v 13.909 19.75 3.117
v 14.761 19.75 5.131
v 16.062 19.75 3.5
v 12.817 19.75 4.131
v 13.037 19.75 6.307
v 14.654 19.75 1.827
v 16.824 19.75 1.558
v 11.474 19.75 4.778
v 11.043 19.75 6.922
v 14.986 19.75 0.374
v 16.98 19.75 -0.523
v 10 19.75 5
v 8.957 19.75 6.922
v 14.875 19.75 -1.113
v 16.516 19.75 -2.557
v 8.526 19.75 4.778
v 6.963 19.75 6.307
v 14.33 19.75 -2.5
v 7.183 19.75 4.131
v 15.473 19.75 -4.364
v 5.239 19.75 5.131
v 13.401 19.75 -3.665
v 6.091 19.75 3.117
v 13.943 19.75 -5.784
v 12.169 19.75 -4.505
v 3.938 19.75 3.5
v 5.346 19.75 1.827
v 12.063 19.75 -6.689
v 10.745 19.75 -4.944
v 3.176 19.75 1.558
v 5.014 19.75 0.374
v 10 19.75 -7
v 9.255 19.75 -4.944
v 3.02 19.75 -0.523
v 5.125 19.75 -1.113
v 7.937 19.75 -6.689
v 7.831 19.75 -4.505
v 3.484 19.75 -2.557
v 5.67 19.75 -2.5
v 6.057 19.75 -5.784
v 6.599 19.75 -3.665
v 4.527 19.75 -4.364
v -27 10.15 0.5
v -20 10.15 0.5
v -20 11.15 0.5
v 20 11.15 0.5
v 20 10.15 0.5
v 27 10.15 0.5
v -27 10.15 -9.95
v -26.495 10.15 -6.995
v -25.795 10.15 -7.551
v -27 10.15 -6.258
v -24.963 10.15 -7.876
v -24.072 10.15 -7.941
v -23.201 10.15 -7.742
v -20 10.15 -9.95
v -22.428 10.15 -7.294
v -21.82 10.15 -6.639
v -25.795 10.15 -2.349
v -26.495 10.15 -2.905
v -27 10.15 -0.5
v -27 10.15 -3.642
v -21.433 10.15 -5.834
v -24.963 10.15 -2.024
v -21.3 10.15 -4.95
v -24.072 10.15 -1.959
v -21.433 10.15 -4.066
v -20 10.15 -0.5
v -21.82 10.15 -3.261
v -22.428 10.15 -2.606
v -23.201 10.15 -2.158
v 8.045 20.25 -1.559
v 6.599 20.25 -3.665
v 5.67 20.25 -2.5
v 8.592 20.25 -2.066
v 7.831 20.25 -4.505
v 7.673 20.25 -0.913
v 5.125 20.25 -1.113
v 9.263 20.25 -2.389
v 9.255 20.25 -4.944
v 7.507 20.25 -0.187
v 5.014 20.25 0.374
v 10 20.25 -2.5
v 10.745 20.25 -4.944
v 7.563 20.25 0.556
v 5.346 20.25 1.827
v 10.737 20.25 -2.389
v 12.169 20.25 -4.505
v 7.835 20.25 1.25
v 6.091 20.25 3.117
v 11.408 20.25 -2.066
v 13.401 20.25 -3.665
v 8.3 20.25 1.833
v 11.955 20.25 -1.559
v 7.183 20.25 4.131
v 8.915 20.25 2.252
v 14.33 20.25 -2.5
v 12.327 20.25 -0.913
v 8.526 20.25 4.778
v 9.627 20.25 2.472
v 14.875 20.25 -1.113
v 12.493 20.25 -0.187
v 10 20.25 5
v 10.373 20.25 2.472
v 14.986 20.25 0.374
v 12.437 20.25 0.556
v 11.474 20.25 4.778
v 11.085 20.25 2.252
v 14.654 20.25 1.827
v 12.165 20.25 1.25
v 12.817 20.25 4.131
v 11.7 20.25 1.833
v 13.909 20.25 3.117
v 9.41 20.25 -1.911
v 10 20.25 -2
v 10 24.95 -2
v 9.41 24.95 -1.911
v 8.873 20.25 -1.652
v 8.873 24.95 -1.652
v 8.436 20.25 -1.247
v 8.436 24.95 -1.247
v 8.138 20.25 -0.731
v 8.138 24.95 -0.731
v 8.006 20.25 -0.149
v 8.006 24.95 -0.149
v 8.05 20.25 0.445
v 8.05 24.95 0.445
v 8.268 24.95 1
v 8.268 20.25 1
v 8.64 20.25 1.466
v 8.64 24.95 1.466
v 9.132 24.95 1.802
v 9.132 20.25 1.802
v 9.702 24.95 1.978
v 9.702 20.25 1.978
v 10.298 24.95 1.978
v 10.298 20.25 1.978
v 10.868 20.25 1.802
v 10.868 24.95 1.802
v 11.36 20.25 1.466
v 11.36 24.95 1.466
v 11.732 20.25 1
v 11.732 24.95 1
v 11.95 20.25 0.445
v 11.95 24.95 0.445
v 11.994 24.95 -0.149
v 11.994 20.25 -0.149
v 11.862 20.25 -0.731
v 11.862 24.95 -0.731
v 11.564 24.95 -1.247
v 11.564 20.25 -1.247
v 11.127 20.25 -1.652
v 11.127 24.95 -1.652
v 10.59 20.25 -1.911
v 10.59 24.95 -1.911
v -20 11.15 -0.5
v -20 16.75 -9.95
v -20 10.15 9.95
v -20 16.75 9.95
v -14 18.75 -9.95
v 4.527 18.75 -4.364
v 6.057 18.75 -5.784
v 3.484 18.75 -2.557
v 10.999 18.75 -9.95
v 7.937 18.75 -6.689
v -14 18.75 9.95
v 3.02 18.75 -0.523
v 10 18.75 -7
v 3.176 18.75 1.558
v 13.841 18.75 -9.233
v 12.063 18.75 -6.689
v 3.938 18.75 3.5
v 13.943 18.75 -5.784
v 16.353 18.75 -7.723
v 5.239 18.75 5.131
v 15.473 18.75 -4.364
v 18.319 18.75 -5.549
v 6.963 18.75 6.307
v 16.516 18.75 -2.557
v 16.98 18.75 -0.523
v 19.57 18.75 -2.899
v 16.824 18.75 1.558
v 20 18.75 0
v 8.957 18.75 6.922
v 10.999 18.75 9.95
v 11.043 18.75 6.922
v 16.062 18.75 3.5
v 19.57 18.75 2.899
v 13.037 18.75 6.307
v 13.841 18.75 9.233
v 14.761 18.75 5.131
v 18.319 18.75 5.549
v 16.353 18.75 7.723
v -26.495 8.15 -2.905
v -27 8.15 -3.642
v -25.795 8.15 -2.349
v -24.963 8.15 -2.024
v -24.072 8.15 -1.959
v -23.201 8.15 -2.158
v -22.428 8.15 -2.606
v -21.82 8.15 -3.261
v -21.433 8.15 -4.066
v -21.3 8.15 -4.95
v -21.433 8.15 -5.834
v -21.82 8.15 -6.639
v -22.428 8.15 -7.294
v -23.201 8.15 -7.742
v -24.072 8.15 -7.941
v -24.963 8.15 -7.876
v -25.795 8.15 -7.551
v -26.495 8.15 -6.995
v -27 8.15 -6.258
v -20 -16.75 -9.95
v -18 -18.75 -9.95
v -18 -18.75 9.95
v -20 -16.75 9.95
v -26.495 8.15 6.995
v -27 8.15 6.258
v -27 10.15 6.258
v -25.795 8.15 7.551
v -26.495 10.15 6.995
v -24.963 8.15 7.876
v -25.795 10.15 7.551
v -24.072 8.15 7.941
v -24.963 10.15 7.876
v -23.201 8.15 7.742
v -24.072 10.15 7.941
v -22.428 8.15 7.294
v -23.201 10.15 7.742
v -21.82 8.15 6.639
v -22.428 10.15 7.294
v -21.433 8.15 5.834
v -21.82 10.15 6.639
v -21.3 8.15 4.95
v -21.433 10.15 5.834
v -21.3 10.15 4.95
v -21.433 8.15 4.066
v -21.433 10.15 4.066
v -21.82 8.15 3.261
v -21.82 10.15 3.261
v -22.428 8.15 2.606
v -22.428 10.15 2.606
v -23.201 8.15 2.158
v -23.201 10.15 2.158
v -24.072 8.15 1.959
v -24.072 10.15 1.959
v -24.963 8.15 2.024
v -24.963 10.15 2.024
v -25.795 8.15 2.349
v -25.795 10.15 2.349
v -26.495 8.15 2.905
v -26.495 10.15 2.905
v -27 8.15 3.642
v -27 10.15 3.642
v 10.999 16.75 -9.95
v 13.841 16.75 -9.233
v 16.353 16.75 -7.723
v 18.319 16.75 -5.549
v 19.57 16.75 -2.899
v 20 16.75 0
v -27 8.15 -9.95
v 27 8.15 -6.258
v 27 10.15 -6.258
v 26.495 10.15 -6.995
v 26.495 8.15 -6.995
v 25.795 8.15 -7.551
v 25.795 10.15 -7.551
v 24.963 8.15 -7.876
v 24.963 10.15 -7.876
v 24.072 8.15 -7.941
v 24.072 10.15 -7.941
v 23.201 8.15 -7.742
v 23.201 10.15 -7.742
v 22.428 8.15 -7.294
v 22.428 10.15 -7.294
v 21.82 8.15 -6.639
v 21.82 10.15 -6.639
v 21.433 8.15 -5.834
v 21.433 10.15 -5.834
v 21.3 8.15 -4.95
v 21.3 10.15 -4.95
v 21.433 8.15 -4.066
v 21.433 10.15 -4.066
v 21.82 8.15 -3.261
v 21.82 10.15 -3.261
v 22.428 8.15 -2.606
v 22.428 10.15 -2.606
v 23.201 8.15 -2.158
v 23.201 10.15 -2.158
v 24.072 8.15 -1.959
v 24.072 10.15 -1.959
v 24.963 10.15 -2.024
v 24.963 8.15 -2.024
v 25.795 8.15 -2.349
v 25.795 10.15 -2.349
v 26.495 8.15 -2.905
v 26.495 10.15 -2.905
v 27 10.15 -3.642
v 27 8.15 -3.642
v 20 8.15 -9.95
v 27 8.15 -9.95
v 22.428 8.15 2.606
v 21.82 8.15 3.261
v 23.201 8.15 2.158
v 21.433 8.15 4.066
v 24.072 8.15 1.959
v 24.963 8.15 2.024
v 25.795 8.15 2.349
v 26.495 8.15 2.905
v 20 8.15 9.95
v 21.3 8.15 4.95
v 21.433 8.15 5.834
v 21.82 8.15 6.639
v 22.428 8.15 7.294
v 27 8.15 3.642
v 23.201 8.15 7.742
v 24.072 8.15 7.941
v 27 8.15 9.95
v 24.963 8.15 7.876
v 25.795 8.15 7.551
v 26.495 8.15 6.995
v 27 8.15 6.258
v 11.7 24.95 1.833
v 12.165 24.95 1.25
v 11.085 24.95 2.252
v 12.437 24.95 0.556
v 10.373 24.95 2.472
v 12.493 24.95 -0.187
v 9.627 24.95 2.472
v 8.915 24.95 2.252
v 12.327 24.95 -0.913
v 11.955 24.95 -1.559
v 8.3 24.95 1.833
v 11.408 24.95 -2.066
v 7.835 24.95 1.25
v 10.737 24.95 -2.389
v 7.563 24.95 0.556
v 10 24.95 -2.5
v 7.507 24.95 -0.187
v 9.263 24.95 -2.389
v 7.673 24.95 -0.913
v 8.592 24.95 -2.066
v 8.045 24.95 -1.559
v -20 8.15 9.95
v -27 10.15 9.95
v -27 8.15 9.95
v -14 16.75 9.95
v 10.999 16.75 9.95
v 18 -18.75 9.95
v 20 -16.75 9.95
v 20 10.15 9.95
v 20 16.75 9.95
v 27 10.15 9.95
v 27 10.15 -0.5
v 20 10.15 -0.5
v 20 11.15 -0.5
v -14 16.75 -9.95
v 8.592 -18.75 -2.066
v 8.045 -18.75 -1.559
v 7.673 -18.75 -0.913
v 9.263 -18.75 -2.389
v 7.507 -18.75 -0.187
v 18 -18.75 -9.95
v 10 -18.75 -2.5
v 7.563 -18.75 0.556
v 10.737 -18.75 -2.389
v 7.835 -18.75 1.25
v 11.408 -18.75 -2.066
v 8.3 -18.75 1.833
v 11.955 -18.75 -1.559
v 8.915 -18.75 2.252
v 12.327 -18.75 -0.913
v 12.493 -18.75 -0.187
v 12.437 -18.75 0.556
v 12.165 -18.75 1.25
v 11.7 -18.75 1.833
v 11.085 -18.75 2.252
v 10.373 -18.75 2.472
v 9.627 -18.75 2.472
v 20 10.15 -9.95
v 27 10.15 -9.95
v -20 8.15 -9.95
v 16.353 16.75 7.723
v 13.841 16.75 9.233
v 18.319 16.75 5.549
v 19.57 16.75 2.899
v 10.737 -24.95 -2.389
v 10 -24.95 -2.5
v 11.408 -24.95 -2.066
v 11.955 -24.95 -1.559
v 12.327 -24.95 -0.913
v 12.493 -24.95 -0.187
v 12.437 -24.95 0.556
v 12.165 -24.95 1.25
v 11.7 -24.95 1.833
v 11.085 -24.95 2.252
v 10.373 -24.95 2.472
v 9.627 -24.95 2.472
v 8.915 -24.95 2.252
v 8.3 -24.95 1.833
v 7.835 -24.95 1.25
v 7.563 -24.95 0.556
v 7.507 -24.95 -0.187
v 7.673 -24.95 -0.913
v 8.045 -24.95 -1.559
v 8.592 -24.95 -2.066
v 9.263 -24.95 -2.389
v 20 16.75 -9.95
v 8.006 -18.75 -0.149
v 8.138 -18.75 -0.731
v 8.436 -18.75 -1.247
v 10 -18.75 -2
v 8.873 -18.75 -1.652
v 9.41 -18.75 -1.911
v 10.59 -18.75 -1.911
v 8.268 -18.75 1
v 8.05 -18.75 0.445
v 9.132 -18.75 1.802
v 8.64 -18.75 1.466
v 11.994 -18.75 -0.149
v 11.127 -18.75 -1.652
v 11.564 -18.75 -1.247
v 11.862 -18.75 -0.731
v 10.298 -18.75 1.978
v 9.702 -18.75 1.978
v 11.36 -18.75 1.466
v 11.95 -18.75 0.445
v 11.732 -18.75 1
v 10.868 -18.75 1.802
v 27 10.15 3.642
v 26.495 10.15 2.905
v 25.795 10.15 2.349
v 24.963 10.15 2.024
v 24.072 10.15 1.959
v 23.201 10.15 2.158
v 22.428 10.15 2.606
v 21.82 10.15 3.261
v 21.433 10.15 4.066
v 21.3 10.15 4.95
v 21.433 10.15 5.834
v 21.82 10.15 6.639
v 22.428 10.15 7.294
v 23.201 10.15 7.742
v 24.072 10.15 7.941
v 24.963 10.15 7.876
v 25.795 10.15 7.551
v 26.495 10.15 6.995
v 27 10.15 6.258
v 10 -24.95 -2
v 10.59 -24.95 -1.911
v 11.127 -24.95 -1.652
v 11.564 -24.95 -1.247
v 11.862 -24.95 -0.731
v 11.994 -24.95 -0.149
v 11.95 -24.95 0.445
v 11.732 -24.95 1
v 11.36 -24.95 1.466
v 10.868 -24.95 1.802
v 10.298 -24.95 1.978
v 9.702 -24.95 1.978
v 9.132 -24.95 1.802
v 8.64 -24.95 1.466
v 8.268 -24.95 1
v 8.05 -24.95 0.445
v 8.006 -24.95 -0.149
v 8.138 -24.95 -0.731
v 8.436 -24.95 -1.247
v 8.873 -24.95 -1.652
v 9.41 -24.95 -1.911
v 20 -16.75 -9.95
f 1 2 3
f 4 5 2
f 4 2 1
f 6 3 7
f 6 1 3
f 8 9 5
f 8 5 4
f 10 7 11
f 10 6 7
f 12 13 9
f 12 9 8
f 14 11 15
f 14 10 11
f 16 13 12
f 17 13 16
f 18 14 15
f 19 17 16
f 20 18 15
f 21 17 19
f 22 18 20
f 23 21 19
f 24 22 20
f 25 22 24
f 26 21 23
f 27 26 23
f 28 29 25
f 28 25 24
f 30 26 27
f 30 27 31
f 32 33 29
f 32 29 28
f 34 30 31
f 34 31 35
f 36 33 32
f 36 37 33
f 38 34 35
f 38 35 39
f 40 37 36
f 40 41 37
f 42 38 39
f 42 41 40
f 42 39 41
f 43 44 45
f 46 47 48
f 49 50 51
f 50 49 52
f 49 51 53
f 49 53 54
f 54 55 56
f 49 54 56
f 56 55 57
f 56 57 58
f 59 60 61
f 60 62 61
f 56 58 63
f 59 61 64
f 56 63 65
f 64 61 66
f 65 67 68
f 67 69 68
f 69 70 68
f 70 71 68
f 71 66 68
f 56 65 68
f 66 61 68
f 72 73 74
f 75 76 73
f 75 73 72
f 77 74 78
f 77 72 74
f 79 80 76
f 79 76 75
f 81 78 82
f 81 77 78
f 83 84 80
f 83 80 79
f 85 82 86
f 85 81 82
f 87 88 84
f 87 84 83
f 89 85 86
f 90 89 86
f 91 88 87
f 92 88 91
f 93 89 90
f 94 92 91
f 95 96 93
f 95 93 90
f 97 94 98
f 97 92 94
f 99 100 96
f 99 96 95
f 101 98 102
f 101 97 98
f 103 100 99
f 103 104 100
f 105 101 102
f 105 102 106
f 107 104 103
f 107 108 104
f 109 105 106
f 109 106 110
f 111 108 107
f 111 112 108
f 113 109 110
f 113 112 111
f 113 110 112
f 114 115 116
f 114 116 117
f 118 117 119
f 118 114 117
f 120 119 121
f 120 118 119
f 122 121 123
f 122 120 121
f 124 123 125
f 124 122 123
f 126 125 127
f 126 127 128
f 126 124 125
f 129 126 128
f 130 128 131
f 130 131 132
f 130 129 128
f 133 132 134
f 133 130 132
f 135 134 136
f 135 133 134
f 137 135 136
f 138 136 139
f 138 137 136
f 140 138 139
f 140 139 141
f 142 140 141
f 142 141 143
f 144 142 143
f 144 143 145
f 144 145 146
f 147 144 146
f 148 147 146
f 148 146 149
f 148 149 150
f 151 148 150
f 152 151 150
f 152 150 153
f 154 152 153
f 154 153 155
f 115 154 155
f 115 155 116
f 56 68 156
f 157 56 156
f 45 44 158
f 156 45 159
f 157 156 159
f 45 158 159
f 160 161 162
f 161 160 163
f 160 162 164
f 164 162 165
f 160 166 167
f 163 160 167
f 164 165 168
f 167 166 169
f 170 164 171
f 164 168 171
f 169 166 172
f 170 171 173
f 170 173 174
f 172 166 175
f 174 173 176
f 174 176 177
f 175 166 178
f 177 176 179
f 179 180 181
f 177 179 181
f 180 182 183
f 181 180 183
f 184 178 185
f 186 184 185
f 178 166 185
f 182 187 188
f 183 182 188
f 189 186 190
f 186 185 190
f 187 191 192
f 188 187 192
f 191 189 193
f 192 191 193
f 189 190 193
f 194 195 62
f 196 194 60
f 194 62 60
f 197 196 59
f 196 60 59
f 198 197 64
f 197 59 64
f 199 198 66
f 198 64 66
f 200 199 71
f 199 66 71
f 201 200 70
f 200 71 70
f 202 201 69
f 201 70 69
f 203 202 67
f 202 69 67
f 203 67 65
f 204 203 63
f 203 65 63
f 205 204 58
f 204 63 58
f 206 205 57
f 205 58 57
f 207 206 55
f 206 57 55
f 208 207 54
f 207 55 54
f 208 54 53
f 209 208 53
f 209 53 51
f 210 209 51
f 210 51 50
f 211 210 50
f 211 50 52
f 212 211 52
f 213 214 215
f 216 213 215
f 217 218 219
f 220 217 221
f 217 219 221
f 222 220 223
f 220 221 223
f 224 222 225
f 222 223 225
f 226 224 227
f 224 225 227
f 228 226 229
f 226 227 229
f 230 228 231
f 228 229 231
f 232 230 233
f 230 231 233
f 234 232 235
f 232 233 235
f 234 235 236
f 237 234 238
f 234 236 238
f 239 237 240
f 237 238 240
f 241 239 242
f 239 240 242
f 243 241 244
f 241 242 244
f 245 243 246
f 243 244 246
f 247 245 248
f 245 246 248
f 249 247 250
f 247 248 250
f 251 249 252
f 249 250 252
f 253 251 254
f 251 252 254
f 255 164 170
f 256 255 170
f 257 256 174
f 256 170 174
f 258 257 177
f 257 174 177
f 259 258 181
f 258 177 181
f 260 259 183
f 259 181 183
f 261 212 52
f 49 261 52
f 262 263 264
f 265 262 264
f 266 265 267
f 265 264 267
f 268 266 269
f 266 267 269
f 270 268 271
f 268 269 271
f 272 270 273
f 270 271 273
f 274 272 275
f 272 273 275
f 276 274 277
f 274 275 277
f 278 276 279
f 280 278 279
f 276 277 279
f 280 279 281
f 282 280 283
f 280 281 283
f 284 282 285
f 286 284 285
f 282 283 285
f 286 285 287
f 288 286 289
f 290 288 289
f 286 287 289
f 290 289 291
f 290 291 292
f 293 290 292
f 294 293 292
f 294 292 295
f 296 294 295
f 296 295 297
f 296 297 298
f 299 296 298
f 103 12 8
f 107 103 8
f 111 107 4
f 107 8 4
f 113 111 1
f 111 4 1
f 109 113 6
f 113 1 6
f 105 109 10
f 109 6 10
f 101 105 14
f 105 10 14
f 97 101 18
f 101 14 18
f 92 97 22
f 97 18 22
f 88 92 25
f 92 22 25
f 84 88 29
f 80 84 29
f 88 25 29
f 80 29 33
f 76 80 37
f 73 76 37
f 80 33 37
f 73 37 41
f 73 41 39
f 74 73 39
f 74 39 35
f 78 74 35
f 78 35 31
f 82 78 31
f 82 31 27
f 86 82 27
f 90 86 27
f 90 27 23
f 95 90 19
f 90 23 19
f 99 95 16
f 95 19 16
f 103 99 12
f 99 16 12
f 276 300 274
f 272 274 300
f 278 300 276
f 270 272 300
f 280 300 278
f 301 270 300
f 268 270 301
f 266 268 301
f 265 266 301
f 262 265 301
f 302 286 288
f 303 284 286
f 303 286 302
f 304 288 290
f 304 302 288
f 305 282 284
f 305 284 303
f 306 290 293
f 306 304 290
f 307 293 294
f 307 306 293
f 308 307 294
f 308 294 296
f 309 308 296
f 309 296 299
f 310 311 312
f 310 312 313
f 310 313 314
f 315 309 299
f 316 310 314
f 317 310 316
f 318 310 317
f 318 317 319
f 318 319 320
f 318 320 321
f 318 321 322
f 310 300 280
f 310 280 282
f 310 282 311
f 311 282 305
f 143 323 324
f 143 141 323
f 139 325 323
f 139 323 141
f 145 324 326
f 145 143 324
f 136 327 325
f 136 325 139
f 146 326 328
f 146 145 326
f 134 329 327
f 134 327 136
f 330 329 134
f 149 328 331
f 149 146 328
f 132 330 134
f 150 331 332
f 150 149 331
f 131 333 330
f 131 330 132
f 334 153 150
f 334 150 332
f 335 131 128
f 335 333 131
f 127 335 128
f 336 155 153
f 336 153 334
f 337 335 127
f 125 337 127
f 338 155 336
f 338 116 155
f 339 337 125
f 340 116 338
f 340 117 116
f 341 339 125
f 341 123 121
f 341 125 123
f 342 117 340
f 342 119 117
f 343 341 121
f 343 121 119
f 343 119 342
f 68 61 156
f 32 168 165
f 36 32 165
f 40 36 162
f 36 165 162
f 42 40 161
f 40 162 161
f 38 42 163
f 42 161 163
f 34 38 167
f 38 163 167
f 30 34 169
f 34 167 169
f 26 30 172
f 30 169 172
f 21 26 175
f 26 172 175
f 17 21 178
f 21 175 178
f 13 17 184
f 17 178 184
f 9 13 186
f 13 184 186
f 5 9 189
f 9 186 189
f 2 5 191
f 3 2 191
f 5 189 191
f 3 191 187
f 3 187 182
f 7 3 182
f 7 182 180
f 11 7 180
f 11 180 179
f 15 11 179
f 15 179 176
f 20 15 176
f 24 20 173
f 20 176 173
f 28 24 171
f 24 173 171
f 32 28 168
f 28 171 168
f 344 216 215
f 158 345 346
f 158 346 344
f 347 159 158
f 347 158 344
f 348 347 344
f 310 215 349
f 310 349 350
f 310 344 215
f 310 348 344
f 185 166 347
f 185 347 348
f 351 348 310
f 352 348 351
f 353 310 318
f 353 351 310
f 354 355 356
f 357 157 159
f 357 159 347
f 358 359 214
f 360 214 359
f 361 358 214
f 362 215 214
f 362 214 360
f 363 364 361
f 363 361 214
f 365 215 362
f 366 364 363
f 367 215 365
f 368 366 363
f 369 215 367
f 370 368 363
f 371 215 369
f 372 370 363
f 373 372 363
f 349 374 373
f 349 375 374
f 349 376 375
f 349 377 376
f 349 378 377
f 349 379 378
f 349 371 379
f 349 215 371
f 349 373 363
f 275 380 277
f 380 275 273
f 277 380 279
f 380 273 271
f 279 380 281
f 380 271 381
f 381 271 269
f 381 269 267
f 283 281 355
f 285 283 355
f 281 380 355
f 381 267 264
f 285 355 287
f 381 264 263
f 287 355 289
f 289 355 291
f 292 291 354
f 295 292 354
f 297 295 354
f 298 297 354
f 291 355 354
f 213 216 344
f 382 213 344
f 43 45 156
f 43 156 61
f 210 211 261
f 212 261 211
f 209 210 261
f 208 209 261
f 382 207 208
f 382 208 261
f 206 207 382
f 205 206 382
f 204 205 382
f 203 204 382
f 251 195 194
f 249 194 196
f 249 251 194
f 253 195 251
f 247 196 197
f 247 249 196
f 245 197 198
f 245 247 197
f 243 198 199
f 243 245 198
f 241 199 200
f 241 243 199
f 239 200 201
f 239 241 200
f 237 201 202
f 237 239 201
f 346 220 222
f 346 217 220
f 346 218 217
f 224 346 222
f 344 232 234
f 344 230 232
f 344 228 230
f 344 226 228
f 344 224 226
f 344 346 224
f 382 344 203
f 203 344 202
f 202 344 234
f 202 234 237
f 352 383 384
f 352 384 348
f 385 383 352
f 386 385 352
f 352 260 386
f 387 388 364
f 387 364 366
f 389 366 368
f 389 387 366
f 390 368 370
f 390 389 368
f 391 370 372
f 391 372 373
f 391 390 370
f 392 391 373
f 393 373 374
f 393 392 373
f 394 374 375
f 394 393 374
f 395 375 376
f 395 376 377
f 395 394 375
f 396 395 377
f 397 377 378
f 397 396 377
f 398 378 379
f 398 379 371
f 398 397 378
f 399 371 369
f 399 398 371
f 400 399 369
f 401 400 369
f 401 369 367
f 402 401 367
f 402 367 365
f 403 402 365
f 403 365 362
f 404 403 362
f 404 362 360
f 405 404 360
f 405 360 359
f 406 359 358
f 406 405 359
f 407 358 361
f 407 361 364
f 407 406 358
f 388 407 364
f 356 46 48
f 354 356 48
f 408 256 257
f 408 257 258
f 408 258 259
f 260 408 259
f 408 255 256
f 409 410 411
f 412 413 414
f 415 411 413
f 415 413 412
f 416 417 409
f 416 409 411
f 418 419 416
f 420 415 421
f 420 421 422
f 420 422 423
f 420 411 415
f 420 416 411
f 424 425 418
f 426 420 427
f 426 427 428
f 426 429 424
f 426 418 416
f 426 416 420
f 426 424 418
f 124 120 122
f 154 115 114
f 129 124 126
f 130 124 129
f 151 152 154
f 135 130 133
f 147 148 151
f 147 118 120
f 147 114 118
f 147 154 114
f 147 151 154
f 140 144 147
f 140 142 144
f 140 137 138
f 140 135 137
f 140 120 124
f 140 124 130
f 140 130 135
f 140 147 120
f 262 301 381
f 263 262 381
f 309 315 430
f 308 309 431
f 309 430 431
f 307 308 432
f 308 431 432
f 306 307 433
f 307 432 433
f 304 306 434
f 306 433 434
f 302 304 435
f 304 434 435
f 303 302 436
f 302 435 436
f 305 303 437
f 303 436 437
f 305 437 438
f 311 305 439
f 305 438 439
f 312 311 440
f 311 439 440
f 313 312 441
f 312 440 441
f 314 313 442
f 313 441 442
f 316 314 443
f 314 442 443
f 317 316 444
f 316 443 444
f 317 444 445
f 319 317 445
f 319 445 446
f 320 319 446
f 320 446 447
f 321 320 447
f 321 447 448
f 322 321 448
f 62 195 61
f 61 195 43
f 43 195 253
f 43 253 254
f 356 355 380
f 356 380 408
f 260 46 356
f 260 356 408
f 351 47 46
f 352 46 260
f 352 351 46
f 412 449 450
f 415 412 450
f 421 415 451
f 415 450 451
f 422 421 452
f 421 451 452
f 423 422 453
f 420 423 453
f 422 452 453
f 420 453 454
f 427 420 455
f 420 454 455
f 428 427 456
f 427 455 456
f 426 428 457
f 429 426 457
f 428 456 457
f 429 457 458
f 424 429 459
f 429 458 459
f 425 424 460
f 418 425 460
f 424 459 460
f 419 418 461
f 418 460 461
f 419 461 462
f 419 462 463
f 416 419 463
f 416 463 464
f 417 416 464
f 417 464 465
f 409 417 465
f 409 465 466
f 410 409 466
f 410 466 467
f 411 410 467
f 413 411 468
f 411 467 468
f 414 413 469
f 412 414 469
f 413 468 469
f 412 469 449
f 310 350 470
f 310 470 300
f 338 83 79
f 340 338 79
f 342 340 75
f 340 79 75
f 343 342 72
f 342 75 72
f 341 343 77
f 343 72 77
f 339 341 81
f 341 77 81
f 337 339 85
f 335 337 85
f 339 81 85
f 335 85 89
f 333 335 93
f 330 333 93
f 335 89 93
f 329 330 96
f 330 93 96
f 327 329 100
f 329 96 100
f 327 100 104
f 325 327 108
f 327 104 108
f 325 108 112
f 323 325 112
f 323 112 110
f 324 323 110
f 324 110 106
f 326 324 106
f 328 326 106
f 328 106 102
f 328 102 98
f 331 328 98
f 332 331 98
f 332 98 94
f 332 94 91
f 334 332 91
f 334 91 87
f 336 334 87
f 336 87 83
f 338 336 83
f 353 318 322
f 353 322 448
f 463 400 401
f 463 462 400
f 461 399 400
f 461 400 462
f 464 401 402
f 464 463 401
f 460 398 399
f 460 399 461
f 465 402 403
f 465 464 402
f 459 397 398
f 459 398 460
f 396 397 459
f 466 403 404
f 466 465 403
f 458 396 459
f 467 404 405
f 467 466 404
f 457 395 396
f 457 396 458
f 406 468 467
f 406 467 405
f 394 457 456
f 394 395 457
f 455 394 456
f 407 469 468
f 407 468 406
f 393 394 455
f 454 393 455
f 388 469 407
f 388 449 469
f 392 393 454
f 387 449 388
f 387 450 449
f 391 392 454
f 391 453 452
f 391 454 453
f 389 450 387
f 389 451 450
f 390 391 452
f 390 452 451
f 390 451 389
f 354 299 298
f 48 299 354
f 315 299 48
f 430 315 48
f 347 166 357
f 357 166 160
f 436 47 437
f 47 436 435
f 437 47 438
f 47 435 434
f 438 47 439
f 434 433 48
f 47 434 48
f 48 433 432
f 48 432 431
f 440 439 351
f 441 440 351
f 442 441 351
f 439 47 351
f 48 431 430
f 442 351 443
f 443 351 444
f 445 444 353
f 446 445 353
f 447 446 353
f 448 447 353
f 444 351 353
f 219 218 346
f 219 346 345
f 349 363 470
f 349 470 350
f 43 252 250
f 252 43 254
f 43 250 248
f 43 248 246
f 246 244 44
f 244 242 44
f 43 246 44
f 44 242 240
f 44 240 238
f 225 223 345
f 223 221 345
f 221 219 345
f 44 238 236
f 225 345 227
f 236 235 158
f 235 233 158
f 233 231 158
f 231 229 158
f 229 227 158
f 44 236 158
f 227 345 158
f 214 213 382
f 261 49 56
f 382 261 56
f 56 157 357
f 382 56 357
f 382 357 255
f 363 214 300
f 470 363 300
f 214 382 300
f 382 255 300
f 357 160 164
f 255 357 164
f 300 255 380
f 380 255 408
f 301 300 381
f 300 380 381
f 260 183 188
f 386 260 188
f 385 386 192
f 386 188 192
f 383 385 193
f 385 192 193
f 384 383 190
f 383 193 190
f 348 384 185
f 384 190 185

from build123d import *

# Parameters (mm, degrees)
SKETCH_2_W          = 40
SKETCH_2_H          = 37.5
EXTRUDE_1_DEPTH     = 9.95
SKETCH_3_W          = 7
SKETCH_3_H          = 2
EXTRUDE_2_DEPTH     = 19.9
EXTRUDE_2_2_DEPTH   = 19.9
SKETCH_4_R          = 3
CUT_EXTRUDE_1_DEPTH = 19.9
SKETCH_5_W          = 7
SKETCH_5_H          = 1
EXTRUDE_3_DEPTH     = 1
CUT_EXTRUDE_2_DEPTH = 35.492970298
CUT_EXTRUDE_6_DEPTH = 2
CUT_EXTRUDE_7_DEPTH = 2
SKETCH_10_R         = 2.5
SKETCH_10_R_2       = 2
EXTRUDE_4_DEPTH     = 6.2
SKETCH_11_R         = 7
EXTRUDE_5_DEPTH     = 1
SKETCH_12_R         = 5
EXTRUDE_6_DEPTH     = 0.5
EXTRUDE_START       = 6.2
SKETCH_13_R         = 2.5
SKETCH_13_R_2       = 2
EXTRUDE_7_DEPTH     = 6.2
CHAMFER_1_SIZE      = 2


with BuildPart() as part:
    # 草图2 → 凸台-拉伸1 (new, symmetric)
    with BuildSketch(Plane.XY):
        Rectangle(SKETCH_2_W, SKETCH_2_H)
    extrude(amount=EXTRUDE_1_DEPTH, both=True)



with BuildPart() as body_2:
    # 草图3 → 凸台-拉伸2 (new body)
    with BuildSketch(Plane.XY.offset(9.95)):
        with Locations((23.5, 9.15)):
            Rectangle(SKETCH_3_W, SKETCH_3_H)
    extrude(amount=-EXTRUDE_2_DEPTH)


with BuildPart() as body_3:
    # 草图3 → Extrude 2 2 (new body)
    with BuildSketch(Plane.XY.offset(9.95)):
        with Locations((-23.5, 9.15)):
            Rectangle(SKETCH_3_W, SKETCH_3_H)
    extrude(amount=-EXTRUDE_2_2_DEPTH)


with BuildPart() as cut_extrude_1_tool:
    # 草图4 → 切除-拉伸1 (new body)
    with BuildSketch(Plane(origin=(0, 10.15, 0), x_dir=(1, 0, 0), z_dir=(0, 1, 0))):
        with Locations((-24.3, 4.95)):
            Circle(SKETCH_4_R)
        with Locations((24.3, 4.95)):
            Circle(SKETCH_4_R)
        with Locations((24.3, -4.95)):
            Circle(SKETCH_4_R)
        with Locations((-24.3, -4.95)):
            Circle(SKETCH_4_R)
    extrude(amount=-CUT_EXTRUDE_1_DEPTH)


with BuildPart() as body_2_1:
    add(body_2.part)

    # 切除-拉伸1: cut by cut_extrude_1_tool
    add(cut_extrude_1_tool.part, mode=Mode.SUBTRACT)


with BuildPart() as body_3_1:
    add(body_3.part)

    # 切除-拉伸1: cut by cut_extrude_1_tool
    add(cut_extrude_1_tool.part, mode=Mode.SUBTRACT)


with BuildPart() as part_1:
    add(part.part)

    add(body_2_1.part)  # 凸台-拉伸3 merges body 2

    add(body_3_1.part)  # 凸台-拉伸3 merges body 3
    # 草图5 → 凸台-拉伸3 (add)
    with BuildSketch(Plane(origin=(0, 10.15, 0), x_dir=(1, 0, 0), z_dir=(0, 1, 0))):
        Polygon((-27, 0), (-27, 0.5), (-20, 0.5), (-20, -0.5), (-27, -0.5), align=None)
        with Locations((23.5, 0)):
            Rectangle(SKETCH_5_W, SKETCH_5_H)
    extrude(amount=EXTRUDE_3_DEPTH)

    # 草图6 → 切除-拉伸2 (cut, through all)
    with BuildSketch(Plane.XY.offset(0.5)):
        Polygon((20, 11.15), (27, 10.15), (27, 11.15), align=None)
        Polygon((-27, 10.15), (-27, 11.15), (-20, 11.15), align=None)
    extrude(amount=-CUT_EXTRUDE_2_DEPTH, mode=Mode.SUBTRACT)

    # 草图8 → 切除-拉伸6 (cut)
    with BuildSketch(Plane(origin=(0, 18.75, 0), x_dir=(1, 0, 0), z_dir=(0, 1, 0))):
        Polygon((-20, 9.95), (-20, -9.95), (-14, -9.95), (-14, -9.85), (-14, 9.85), (-14, 9.95), align=None)
    extrude(amount=-CUT_EXTRUDE_6_DEPTH, mode=Mode.SUBTRACT)

    # 草图9 → 切除-拉伸7 (cut)
    with BuildSketch(Plane(origin=(0, 18.75, 0), x_dir=(1, 0, 0), z_dir=(0, 1, 0))):
        with BuildLine():
            Line((20, 1.9e-08), (20, 9.95))
            Line((20, 9.95), (10.998749218, 9.95))
            ThreePointArc((10.998749218, 9.95), (17.41577683, 6.708670062), (20, 1.9e-08))
        make_face()
        with BuildLine():
            Line((20, -9.95), (20, 1.9e-08))
            ThreePointArc((20, 1.9e-08), (17.415776843, -6.708670048), (10.998749218, -9.95))
            Line((10.998749218, -9.95), (20, -9.95))
        make_face()
    extrude(amount=-CUT_EXTRUDE_7_DEPTH, mode=Mode.SUBTRACT)

    # 草图10 → 凸台-拉伸4 (add)
    with BuildSketch(Plane(origin=(0, 18.75, 0), x_dir=(1, 0, 0), z_dir=(0, 1, 0))):
        with Locations(Location((10, 0, 0), (0, 0, 90))):
            Circle(SKETCH_10_R)
        with Locations(Location((10, 0, 0), (0, 0, 90))):
            Circle(SKETCH_10_R_2, mode=Mode.SUBTRACT)
    extrude(amount=EXTRUDE_4_DEPTH)

    # 草图11 → 凸台-拉伸5 (add)
    with BuildSketch(Plane(origin=(0, 18.75, 0), x_dir=(1, 0, 0), z_dir=(0, 1, 0))):
        with Locations(Location((10, 0, 0), (0, 0, 90))):
            Circle(SKETCH_11_R)
    extrude(amount=EXTRUDE_5_DEPTH)

    # 草图12 → 凸台-拉伸6 (add)
    with BuildSketch(Plane(origin=(0, 19.75, 0), x_dir=(1, 0, 0), z_dir=(0, 1, 0))):
        with Locations(Location((10, 0, 0), (0, 0, 270))):
            Circle(SKETCH_12_R)
    extrude(amount=EXTRUDE_6_DEPTH)

    # 草图13 → 凸台-拉伸7 (add)
    with BuildSketch(Plane.XZ.offset(18.75).offset(EXTRUDE_START)):
        with Locations(Location((10, 0, 0), (0, 0, 270))):
            Circle(SKETCH_13_R)
        with Locations(Location((10, 0, 0), (0, 0, 270))):
            Circle(SKETCH_13_R_2, mode=Mode.SUBTRACT)
    extrude(amount=-EXTRUDE_7_DEPTH)

    # 倒角1
    chamfer_1_edges = [part_1.edges().sort_by_distance(p)[0] for p in [
        (20, -18.75, 0),
        (-20, -18.75, 0),
    ]]
    chamfer(chamfer_1_edges, length=CHAMFER_1_SIZE)


solid = part_1.part
